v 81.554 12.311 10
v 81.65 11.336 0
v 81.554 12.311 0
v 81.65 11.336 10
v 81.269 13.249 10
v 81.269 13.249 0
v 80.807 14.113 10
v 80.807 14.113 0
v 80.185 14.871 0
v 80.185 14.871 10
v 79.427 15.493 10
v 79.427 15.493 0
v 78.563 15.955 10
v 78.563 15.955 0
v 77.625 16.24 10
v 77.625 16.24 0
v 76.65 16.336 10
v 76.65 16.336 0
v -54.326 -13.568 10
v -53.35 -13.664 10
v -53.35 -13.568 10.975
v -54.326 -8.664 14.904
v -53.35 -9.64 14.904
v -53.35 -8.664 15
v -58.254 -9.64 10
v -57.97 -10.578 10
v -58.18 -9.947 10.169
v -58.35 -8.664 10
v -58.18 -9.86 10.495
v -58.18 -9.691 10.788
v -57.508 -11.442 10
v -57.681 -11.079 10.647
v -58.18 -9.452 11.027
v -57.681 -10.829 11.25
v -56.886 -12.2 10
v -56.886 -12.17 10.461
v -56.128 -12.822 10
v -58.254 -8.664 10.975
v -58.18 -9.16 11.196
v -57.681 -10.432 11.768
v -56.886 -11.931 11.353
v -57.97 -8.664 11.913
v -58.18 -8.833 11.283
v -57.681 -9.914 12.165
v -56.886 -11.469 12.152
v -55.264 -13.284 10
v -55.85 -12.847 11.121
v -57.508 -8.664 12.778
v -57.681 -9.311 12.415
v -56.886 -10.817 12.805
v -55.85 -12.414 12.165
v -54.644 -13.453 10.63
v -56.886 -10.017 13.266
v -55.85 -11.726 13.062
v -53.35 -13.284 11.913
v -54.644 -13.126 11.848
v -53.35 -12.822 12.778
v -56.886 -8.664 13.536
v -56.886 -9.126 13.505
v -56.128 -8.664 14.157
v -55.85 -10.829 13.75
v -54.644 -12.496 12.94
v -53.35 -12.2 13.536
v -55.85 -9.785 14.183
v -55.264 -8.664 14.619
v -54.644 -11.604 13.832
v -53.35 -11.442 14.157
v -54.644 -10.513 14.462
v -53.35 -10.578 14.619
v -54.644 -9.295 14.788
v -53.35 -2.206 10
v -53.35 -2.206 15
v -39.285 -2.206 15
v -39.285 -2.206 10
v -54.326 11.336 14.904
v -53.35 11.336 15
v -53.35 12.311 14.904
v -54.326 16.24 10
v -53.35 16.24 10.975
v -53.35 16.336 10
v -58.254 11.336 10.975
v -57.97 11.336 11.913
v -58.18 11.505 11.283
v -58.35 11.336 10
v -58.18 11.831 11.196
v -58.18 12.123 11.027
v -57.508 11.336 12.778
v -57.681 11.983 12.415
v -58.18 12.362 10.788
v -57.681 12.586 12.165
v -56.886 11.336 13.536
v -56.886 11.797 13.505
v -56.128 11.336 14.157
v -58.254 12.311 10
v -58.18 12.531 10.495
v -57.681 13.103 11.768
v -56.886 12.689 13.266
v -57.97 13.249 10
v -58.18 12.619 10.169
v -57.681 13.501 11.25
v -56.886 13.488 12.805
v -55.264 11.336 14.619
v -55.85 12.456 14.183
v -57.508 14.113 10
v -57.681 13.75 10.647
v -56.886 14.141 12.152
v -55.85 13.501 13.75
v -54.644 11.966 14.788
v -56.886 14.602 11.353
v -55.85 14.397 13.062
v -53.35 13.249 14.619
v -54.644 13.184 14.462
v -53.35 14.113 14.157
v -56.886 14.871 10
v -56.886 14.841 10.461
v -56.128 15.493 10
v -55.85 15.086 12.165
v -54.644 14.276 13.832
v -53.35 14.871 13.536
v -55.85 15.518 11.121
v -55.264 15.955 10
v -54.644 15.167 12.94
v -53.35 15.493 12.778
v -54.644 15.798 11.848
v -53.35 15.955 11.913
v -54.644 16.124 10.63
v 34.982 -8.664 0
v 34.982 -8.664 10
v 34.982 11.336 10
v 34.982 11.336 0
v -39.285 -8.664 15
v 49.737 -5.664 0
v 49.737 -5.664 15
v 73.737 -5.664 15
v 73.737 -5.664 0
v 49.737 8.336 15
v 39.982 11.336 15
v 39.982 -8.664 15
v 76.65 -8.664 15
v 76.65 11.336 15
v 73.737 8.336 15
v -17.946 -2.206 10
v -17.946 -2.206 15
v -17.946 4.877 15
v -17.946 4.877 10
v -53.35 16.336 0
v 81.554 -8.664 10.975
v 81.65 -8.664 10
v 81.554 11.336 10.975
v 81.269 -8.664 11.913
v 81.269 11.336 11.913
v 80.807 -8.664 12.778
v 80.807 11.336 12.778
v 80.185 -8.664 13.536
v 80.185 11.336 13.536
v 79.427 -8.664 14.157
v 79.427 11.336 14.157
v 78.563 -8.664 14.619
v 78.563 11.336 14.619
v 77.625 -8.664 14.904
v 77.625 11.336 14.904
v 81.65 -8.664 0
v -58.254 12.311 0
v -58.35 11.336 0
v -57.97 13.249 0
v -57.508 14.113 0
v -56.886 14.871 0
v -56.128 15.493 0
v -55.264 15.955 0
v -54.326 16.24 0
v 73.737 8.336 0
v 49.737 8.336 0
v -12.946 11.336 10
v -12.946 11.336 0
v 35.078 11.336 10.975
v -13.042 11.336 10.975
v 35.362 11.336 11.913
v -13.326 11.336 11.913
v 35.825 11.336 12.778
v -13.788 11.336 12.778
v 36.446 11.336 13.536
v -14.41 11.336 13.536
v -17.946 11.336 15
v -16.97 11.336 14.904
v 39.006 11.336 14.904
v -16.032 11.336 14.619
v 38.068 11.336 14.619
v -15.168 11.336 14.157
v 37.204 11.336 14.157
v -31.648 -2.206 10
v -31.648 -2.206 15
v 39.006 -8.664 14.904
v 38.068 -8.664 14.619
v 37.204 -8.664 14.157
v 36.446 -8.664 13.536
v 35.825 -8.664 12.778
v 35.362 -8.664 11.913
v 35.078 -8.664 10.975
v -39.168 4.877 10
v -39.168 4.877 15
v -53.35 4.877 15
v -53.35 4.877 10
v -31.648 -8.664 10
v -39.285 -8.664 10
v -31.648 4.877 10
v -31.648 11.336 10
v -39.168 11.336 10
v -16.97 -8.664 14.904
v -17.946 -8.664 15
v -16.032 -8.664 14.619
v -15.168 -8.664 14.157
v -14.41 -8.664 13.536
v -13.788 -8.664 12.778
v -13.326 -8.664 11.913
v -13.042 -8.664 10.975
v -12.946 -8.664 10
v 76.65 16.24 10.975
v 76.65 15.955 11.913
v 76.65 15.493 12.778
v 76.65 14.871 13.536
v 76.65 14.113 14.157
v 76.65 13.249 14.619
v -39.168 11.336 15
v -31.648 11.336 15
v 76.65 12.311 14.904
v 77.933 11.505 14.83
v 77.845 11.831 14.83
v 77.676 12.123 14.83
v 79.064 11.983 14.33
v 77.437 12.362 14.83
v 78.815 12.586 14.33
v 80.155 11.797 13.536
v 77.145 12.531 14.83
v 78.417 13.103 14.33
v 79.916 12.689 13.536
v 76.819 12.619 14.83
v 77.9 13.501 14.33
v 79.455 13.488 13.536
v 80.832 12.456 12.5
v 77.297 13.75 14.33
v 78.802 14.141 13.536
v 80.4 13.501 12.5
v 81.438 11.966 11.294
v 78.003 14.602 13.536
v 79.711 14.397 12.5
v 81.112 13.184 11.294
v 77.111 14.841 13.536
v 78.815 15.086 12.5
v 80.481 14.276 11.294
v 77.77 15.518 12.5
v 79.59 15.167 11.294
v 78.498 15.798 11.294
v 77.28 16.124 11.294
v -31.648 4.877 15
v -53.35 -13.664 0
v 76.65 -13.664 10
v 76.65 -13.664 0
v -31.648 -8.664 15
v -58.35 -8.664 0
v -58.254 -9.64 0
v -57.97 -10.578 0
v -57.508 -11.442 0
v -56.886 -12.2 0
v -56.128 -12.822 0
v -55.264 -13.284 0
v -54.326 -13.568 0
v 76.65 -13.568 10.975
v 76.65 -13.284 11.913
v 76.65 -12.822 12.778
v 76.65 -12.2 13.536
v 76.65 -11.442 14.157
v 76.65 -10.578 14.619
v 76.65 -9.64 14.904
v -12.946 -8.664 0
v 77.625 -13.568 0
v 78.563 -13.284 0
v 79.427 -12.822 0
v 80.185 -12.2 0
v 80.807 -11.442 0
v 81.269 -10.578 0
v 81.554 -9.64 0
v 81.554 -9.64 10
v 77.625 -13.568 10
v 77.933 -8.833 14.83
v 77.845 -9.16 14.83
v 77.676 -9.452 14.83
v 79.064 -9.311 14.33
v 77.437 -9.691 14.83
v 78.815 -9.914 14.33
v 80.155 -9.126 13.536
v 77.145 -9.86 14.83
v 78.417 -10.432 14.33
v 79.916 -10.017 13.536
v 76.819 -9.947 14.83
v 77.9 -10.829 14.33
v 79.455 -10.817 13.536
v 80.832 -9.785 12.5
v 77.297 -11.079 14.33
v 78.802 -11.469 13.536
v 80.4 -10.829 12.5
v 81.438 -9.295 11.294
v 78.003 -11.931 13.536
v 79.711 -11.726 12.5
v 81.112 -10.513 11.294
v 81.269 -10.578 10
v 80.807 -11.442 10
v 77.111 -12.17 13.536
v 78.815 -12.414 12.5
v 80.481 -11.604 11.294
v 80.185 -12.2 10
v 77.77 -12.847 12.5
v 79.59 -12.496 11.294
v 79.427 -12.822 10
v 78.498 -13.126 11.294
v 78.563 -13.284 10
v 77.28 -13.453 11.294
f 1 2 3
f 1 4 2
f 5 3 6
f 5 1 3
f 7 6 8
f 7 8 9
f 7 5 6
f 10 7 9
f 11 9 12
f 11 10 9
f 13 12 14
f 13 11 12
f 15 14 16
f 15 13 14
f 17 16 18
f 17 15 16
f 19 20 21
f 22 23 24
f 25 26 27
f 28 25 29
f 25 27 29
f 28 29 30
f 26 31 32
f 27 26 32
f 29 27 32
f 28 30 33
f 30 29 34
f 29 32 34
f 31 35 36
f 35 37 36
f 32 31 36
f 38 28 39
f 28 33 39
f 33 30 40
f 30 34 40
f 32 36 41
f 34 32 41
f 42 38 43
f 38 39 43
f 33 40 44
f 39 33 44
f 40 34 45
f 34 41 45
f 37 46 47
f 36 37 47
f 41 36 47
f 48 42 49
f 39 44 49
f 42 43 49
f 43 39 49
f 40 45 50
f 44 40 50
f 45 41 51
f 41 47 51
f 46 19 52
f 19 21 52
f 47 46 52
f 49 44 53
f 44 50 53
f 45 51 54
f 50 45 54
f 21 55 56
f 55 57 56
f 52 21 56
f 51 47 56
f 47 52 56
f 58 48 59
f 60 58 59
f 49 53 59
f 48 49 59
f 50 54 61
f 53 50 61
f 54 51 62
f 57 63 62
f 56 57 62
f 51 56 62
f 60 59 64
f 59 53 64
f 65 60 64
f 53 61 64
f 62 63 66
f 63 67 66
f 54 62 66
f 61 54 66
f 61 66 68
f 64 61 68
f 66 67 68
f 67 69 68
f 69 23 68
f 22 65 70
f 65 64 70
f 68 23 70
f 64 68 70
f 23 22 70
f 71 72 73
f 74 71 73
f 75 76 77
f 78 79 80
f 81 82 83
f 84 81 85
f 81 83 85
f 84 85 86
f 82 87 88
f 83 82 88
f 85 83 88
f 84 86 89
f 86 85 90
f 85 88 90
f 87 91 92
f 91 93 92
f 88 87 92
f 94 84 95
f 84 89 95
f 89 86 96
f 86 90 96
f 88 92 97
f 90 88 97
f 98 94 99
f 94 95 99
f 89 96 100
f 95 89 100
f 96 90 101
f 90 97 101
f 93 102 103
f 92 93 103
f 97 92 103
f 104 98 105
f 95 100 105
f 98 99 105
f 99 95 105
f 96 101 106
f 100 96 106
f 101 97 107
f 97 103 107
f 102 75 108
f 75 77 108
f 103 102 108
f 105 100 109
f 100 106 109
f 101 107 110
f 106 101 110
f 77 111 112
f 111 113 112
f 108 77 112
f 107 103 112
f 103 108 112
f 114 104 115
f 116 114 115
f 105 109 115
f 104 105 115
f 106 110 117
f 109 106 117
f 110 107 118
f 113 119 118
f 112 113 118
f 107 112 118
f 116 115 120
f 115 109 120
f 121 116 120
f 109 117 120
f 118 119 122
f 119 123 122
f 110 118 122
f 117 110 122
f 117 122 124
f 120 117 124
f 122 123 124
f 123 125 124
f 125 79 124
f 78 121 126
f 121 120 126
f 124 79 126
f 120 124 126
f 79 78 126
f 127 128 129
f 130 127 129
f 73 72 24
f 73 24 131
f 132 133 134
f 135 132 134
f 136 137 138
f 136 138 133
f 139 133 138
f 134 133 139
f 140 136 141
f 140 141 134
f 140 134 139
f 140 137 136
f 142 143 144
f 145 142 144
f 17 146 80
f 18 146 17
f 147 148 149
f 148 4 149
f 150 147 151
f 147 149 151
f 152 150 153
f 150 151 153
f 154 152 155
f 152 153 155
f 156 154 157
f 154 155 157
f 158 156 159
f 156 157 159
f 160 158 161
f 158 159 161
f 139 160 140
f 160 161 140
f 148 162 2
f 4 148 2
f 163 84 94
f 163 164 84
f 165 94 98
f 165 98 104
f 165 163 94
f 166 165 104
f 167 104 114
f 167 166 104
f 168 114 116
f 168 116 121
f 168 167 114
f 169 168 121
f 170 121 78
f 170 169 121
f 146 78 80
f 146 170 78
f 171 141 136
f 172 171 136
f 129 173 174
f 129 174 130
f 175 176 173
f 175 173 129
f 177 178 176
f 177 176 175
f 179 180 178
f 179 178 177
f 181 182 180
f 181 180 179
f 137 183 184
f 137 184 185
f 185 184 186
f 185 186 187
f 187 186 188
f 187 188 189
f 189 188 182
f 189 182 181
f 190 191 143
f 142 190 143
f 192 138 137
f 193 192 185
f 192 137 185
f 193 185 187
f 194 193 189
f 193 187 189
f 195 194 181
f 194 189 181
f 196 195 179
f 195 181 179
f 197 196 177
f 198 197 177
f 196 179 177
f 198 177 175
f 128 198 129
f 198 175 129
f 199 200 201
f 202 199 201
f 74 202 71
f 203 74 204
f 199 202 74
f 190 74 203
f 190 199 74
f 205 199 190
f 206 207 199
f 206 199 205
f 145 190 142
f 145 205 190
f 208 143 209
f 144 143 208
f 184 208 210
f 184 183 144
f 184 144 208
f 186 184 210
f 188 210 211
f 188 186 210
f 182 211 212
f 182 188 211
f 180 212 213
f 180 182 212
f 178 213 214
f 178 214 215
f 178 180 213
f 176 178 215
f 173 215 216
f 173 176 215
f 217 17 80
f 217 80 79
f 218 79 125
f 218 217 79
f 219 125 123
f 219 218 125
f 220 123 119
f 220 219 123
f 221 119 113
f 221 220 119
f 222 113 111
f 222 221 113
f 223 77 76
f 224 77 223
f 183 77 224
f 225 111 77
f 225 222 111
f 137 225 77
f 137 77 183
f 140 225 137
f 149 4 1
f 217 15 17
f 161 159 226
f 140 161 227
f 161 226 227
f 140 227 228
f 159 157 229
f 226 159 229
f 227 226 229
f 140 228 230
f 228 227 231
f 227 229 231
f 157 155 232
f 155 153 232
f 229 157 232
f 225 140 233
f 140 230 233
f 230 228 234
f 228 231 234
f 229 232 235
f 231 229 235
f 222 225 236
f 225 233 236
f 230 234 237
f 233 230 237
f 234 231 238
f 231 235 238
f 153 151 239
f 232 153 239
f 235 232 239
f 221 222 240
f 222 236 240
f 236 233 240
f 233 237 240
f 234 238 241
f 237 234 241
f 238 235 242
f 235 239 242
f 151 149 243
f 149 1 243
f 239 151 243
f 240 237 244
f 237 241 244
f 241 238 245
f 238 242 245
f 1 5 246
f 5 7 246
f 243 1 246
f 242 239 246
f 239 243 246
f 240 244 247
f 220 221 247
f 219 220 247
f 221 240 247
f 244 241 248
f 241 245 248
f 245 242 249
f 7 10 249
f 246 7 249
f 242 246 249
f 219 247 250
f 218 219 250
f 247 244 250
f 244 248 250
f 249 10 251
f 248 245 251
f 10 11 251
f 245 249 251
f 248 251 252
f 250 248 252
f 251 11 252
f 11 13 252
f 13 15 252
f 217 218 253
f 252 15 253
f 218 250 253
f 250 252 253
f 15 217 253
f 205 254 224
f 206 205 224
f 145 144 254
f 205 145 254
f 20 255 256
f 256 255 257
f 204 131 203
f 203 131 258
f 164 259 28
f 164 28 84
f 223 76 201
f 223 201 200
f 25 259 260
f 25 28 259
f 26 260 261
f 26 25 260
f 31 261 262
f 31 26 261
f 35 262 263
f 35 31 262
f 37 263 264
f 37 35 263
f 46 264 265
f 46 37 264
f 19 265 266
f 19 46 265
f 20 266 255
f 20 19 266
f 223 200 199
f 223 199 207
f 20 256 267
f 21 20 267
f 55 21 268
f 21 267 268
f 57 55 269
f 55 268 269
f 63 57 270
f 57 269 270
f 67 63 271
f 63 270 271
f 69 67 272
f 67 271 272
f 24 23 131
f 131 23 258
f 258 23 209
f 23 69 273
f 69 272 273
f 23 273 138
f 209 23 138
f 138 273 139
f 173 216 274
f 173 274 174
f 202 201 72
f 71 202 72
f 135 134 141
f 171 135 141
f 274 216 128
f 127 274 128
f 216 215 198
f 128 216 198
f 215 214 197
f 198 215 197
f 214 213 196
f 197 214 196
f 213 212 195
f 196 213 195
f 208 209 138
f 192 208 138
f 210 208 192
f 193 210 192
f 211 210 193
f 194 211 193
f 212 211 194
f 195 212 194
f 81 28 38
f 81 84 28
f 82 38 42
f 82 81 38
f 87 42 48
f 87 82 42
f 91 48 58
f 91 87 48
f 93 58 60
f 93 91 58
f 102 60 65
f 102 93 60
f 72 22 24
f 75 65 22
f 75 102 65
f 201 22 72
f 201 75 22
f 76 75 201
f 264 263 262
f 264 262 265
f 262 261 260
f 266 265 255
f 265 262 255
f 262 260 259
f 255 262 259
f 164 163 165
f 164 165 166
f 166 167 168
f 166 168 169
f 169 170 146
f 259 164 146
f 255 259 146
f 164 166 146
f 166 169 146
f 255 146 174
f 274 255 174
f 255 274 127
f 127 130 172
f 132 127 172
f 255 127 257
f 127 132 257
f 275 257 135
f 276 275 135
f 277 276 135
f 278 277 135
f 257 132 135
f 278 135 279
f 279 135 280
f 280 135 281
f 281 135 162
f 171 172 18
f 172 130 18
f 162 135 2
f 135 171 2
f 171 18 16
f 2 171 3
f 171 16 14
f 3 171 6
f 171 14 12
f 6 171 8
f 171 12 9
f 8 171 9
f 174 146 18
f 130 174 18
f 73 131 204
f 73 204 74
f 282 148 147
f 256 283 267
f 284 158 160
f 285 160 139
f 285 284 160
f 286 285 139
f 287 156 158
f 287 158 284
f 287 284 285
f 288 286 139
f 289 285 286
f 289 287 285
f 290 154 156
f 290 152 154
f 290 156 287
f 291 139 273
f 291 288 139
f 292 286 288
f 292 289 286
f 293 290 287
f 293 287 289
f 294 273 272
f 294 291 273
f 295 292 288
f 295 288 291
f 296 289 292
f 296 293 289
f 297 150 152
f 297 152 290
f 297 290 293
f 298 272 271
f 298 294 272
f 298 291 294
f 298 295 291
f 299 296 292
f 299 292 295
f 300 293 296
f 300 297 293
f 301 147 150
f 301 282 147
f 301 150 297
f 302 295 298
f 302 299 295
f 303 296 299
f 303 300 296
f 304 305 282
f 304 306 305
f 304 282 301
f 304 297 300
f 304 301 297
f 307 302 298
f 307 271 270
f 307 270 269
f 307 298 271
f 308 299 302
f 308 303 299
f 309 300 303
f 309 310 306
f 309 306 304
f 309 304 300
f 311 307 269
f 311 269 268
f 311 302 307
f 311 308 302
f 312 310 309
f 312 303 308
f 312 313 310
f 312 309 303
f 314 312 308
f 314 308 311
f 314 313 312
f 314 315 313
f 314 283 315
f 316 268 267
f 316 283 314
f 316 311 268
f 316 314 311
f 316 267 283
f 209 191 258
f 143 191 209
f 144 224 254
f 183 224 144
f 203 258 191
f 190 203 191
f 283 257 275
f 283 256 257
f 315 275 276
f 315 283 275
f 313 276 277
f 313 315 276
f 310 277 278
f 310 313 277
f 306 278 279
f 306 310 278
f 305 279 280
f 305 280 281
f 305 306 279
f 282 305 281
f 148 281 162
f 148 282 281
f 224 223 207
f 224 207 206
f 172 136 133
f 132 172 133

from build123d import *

# Parameters (mm, degrees)
F0_W     = 140
F0_H     = 30
F1_DEPTH = 15
F2_R     = 5
F3_W     = 47.9276580736
F3_H     = 20
F4_DEPTH = 25
F5_R     = 5
F6_R     = 5
F8_DEPTH = 25
F7_W     = 7.5194314122
F7_H     = 6.4587649889
F7_W_2   = 7.6362714171
F9_DEPTH = 5


with BuildPart() as f1:
    # F0 (on Top) → F1 (new body)
    with BuildSketch(Plane.XY):
        with Locations((11.6495971382, 1.335599795)):
            Rectangle(F0_W, F0_H)
    extrude(amount=F1_DEPTH)

    # F2
    f2_edges = [f1.edges().sort_by_distance(p)[0] for p in [
        (81.649597, -13.6644, 7.5),
        (81.649597, 16.3356, 7.5),
        (81.649597, 1.3356, 15),
        (11.649597, -13.6644, 15),
        (11.649597, 16.3356, 15),
    ]]
    fillet(f2_edges, radius=F2_R)

    # F3 (on face) → F4 (cut)
    with BuildSketch(Plane.XY.offset(15)):
        with Locations((11.0180326737, 1.335599795)):
            Rectangle(F3_W, F3_H)
    extrude(amount=-F4_DEPTH, mode=Mode.SUBTRACT)

    # F5
    f5_edges = [f1.edges().sort_by_distance(p)[0] for p in [
        (-12.945796, 1.3356, 15),
        (34.981862, 1.3356, 15),
    ]]
    fillet(f5_edges, radius=F5_R)

    # F6
    f6_edges = [f1.edges().sort_by_distance(p)[0] for p in [
        (-58.350403, 1.3356, 15),
    ]]
    fillet(f6_edges, radius=F6_R)

    # F7 (on face) → F8 (cut)
    with BuildSketch(Plane.XY.offset(15)):
        Polygon((73.7369505465, 1.335599795), (73.7369505465, 8.335599795), (49.7369505465, 8.335599795), (49.7369505465, 1.335599795), (49.7369505465, -5.664400205), (73.7369505465, -5.664400205), align=None)
    extrude(amount=-F8_DEPTH, mode=Mode.SUBTRACT)

    # F7 (on face) → F9 (cut)
    with BuildSketch(Plane.XY.offset(15)):
        Polygon((-53.3504028618, 1.335599795), (-53.3504028618, -2.2056352161), (-39.2847135663, -2.2056352161), (-31.6484421492, -2.2056352161), (-17.9457963631, -2.2056352161), (-17.9457963631, 1.335599795), (-17.9457963631, 4.8768348061), (-31.6484421492, 4.8768348061), (-39.1678735614, 4.8768348061), (-53.3504028618, 4.8768348061), align=None)
        with Locations((-35.4081578553, 8.1062173005)):
            Rectangle(F7_W, F7_H)
        with Locations((-35.4665778577, -5.4350177106)):
            Rectangle(F7_W_2, F7_H)
    extrude(amount=-F9_DEPTH, mode=Mode.SUBTRACT)


solid = f1.part
